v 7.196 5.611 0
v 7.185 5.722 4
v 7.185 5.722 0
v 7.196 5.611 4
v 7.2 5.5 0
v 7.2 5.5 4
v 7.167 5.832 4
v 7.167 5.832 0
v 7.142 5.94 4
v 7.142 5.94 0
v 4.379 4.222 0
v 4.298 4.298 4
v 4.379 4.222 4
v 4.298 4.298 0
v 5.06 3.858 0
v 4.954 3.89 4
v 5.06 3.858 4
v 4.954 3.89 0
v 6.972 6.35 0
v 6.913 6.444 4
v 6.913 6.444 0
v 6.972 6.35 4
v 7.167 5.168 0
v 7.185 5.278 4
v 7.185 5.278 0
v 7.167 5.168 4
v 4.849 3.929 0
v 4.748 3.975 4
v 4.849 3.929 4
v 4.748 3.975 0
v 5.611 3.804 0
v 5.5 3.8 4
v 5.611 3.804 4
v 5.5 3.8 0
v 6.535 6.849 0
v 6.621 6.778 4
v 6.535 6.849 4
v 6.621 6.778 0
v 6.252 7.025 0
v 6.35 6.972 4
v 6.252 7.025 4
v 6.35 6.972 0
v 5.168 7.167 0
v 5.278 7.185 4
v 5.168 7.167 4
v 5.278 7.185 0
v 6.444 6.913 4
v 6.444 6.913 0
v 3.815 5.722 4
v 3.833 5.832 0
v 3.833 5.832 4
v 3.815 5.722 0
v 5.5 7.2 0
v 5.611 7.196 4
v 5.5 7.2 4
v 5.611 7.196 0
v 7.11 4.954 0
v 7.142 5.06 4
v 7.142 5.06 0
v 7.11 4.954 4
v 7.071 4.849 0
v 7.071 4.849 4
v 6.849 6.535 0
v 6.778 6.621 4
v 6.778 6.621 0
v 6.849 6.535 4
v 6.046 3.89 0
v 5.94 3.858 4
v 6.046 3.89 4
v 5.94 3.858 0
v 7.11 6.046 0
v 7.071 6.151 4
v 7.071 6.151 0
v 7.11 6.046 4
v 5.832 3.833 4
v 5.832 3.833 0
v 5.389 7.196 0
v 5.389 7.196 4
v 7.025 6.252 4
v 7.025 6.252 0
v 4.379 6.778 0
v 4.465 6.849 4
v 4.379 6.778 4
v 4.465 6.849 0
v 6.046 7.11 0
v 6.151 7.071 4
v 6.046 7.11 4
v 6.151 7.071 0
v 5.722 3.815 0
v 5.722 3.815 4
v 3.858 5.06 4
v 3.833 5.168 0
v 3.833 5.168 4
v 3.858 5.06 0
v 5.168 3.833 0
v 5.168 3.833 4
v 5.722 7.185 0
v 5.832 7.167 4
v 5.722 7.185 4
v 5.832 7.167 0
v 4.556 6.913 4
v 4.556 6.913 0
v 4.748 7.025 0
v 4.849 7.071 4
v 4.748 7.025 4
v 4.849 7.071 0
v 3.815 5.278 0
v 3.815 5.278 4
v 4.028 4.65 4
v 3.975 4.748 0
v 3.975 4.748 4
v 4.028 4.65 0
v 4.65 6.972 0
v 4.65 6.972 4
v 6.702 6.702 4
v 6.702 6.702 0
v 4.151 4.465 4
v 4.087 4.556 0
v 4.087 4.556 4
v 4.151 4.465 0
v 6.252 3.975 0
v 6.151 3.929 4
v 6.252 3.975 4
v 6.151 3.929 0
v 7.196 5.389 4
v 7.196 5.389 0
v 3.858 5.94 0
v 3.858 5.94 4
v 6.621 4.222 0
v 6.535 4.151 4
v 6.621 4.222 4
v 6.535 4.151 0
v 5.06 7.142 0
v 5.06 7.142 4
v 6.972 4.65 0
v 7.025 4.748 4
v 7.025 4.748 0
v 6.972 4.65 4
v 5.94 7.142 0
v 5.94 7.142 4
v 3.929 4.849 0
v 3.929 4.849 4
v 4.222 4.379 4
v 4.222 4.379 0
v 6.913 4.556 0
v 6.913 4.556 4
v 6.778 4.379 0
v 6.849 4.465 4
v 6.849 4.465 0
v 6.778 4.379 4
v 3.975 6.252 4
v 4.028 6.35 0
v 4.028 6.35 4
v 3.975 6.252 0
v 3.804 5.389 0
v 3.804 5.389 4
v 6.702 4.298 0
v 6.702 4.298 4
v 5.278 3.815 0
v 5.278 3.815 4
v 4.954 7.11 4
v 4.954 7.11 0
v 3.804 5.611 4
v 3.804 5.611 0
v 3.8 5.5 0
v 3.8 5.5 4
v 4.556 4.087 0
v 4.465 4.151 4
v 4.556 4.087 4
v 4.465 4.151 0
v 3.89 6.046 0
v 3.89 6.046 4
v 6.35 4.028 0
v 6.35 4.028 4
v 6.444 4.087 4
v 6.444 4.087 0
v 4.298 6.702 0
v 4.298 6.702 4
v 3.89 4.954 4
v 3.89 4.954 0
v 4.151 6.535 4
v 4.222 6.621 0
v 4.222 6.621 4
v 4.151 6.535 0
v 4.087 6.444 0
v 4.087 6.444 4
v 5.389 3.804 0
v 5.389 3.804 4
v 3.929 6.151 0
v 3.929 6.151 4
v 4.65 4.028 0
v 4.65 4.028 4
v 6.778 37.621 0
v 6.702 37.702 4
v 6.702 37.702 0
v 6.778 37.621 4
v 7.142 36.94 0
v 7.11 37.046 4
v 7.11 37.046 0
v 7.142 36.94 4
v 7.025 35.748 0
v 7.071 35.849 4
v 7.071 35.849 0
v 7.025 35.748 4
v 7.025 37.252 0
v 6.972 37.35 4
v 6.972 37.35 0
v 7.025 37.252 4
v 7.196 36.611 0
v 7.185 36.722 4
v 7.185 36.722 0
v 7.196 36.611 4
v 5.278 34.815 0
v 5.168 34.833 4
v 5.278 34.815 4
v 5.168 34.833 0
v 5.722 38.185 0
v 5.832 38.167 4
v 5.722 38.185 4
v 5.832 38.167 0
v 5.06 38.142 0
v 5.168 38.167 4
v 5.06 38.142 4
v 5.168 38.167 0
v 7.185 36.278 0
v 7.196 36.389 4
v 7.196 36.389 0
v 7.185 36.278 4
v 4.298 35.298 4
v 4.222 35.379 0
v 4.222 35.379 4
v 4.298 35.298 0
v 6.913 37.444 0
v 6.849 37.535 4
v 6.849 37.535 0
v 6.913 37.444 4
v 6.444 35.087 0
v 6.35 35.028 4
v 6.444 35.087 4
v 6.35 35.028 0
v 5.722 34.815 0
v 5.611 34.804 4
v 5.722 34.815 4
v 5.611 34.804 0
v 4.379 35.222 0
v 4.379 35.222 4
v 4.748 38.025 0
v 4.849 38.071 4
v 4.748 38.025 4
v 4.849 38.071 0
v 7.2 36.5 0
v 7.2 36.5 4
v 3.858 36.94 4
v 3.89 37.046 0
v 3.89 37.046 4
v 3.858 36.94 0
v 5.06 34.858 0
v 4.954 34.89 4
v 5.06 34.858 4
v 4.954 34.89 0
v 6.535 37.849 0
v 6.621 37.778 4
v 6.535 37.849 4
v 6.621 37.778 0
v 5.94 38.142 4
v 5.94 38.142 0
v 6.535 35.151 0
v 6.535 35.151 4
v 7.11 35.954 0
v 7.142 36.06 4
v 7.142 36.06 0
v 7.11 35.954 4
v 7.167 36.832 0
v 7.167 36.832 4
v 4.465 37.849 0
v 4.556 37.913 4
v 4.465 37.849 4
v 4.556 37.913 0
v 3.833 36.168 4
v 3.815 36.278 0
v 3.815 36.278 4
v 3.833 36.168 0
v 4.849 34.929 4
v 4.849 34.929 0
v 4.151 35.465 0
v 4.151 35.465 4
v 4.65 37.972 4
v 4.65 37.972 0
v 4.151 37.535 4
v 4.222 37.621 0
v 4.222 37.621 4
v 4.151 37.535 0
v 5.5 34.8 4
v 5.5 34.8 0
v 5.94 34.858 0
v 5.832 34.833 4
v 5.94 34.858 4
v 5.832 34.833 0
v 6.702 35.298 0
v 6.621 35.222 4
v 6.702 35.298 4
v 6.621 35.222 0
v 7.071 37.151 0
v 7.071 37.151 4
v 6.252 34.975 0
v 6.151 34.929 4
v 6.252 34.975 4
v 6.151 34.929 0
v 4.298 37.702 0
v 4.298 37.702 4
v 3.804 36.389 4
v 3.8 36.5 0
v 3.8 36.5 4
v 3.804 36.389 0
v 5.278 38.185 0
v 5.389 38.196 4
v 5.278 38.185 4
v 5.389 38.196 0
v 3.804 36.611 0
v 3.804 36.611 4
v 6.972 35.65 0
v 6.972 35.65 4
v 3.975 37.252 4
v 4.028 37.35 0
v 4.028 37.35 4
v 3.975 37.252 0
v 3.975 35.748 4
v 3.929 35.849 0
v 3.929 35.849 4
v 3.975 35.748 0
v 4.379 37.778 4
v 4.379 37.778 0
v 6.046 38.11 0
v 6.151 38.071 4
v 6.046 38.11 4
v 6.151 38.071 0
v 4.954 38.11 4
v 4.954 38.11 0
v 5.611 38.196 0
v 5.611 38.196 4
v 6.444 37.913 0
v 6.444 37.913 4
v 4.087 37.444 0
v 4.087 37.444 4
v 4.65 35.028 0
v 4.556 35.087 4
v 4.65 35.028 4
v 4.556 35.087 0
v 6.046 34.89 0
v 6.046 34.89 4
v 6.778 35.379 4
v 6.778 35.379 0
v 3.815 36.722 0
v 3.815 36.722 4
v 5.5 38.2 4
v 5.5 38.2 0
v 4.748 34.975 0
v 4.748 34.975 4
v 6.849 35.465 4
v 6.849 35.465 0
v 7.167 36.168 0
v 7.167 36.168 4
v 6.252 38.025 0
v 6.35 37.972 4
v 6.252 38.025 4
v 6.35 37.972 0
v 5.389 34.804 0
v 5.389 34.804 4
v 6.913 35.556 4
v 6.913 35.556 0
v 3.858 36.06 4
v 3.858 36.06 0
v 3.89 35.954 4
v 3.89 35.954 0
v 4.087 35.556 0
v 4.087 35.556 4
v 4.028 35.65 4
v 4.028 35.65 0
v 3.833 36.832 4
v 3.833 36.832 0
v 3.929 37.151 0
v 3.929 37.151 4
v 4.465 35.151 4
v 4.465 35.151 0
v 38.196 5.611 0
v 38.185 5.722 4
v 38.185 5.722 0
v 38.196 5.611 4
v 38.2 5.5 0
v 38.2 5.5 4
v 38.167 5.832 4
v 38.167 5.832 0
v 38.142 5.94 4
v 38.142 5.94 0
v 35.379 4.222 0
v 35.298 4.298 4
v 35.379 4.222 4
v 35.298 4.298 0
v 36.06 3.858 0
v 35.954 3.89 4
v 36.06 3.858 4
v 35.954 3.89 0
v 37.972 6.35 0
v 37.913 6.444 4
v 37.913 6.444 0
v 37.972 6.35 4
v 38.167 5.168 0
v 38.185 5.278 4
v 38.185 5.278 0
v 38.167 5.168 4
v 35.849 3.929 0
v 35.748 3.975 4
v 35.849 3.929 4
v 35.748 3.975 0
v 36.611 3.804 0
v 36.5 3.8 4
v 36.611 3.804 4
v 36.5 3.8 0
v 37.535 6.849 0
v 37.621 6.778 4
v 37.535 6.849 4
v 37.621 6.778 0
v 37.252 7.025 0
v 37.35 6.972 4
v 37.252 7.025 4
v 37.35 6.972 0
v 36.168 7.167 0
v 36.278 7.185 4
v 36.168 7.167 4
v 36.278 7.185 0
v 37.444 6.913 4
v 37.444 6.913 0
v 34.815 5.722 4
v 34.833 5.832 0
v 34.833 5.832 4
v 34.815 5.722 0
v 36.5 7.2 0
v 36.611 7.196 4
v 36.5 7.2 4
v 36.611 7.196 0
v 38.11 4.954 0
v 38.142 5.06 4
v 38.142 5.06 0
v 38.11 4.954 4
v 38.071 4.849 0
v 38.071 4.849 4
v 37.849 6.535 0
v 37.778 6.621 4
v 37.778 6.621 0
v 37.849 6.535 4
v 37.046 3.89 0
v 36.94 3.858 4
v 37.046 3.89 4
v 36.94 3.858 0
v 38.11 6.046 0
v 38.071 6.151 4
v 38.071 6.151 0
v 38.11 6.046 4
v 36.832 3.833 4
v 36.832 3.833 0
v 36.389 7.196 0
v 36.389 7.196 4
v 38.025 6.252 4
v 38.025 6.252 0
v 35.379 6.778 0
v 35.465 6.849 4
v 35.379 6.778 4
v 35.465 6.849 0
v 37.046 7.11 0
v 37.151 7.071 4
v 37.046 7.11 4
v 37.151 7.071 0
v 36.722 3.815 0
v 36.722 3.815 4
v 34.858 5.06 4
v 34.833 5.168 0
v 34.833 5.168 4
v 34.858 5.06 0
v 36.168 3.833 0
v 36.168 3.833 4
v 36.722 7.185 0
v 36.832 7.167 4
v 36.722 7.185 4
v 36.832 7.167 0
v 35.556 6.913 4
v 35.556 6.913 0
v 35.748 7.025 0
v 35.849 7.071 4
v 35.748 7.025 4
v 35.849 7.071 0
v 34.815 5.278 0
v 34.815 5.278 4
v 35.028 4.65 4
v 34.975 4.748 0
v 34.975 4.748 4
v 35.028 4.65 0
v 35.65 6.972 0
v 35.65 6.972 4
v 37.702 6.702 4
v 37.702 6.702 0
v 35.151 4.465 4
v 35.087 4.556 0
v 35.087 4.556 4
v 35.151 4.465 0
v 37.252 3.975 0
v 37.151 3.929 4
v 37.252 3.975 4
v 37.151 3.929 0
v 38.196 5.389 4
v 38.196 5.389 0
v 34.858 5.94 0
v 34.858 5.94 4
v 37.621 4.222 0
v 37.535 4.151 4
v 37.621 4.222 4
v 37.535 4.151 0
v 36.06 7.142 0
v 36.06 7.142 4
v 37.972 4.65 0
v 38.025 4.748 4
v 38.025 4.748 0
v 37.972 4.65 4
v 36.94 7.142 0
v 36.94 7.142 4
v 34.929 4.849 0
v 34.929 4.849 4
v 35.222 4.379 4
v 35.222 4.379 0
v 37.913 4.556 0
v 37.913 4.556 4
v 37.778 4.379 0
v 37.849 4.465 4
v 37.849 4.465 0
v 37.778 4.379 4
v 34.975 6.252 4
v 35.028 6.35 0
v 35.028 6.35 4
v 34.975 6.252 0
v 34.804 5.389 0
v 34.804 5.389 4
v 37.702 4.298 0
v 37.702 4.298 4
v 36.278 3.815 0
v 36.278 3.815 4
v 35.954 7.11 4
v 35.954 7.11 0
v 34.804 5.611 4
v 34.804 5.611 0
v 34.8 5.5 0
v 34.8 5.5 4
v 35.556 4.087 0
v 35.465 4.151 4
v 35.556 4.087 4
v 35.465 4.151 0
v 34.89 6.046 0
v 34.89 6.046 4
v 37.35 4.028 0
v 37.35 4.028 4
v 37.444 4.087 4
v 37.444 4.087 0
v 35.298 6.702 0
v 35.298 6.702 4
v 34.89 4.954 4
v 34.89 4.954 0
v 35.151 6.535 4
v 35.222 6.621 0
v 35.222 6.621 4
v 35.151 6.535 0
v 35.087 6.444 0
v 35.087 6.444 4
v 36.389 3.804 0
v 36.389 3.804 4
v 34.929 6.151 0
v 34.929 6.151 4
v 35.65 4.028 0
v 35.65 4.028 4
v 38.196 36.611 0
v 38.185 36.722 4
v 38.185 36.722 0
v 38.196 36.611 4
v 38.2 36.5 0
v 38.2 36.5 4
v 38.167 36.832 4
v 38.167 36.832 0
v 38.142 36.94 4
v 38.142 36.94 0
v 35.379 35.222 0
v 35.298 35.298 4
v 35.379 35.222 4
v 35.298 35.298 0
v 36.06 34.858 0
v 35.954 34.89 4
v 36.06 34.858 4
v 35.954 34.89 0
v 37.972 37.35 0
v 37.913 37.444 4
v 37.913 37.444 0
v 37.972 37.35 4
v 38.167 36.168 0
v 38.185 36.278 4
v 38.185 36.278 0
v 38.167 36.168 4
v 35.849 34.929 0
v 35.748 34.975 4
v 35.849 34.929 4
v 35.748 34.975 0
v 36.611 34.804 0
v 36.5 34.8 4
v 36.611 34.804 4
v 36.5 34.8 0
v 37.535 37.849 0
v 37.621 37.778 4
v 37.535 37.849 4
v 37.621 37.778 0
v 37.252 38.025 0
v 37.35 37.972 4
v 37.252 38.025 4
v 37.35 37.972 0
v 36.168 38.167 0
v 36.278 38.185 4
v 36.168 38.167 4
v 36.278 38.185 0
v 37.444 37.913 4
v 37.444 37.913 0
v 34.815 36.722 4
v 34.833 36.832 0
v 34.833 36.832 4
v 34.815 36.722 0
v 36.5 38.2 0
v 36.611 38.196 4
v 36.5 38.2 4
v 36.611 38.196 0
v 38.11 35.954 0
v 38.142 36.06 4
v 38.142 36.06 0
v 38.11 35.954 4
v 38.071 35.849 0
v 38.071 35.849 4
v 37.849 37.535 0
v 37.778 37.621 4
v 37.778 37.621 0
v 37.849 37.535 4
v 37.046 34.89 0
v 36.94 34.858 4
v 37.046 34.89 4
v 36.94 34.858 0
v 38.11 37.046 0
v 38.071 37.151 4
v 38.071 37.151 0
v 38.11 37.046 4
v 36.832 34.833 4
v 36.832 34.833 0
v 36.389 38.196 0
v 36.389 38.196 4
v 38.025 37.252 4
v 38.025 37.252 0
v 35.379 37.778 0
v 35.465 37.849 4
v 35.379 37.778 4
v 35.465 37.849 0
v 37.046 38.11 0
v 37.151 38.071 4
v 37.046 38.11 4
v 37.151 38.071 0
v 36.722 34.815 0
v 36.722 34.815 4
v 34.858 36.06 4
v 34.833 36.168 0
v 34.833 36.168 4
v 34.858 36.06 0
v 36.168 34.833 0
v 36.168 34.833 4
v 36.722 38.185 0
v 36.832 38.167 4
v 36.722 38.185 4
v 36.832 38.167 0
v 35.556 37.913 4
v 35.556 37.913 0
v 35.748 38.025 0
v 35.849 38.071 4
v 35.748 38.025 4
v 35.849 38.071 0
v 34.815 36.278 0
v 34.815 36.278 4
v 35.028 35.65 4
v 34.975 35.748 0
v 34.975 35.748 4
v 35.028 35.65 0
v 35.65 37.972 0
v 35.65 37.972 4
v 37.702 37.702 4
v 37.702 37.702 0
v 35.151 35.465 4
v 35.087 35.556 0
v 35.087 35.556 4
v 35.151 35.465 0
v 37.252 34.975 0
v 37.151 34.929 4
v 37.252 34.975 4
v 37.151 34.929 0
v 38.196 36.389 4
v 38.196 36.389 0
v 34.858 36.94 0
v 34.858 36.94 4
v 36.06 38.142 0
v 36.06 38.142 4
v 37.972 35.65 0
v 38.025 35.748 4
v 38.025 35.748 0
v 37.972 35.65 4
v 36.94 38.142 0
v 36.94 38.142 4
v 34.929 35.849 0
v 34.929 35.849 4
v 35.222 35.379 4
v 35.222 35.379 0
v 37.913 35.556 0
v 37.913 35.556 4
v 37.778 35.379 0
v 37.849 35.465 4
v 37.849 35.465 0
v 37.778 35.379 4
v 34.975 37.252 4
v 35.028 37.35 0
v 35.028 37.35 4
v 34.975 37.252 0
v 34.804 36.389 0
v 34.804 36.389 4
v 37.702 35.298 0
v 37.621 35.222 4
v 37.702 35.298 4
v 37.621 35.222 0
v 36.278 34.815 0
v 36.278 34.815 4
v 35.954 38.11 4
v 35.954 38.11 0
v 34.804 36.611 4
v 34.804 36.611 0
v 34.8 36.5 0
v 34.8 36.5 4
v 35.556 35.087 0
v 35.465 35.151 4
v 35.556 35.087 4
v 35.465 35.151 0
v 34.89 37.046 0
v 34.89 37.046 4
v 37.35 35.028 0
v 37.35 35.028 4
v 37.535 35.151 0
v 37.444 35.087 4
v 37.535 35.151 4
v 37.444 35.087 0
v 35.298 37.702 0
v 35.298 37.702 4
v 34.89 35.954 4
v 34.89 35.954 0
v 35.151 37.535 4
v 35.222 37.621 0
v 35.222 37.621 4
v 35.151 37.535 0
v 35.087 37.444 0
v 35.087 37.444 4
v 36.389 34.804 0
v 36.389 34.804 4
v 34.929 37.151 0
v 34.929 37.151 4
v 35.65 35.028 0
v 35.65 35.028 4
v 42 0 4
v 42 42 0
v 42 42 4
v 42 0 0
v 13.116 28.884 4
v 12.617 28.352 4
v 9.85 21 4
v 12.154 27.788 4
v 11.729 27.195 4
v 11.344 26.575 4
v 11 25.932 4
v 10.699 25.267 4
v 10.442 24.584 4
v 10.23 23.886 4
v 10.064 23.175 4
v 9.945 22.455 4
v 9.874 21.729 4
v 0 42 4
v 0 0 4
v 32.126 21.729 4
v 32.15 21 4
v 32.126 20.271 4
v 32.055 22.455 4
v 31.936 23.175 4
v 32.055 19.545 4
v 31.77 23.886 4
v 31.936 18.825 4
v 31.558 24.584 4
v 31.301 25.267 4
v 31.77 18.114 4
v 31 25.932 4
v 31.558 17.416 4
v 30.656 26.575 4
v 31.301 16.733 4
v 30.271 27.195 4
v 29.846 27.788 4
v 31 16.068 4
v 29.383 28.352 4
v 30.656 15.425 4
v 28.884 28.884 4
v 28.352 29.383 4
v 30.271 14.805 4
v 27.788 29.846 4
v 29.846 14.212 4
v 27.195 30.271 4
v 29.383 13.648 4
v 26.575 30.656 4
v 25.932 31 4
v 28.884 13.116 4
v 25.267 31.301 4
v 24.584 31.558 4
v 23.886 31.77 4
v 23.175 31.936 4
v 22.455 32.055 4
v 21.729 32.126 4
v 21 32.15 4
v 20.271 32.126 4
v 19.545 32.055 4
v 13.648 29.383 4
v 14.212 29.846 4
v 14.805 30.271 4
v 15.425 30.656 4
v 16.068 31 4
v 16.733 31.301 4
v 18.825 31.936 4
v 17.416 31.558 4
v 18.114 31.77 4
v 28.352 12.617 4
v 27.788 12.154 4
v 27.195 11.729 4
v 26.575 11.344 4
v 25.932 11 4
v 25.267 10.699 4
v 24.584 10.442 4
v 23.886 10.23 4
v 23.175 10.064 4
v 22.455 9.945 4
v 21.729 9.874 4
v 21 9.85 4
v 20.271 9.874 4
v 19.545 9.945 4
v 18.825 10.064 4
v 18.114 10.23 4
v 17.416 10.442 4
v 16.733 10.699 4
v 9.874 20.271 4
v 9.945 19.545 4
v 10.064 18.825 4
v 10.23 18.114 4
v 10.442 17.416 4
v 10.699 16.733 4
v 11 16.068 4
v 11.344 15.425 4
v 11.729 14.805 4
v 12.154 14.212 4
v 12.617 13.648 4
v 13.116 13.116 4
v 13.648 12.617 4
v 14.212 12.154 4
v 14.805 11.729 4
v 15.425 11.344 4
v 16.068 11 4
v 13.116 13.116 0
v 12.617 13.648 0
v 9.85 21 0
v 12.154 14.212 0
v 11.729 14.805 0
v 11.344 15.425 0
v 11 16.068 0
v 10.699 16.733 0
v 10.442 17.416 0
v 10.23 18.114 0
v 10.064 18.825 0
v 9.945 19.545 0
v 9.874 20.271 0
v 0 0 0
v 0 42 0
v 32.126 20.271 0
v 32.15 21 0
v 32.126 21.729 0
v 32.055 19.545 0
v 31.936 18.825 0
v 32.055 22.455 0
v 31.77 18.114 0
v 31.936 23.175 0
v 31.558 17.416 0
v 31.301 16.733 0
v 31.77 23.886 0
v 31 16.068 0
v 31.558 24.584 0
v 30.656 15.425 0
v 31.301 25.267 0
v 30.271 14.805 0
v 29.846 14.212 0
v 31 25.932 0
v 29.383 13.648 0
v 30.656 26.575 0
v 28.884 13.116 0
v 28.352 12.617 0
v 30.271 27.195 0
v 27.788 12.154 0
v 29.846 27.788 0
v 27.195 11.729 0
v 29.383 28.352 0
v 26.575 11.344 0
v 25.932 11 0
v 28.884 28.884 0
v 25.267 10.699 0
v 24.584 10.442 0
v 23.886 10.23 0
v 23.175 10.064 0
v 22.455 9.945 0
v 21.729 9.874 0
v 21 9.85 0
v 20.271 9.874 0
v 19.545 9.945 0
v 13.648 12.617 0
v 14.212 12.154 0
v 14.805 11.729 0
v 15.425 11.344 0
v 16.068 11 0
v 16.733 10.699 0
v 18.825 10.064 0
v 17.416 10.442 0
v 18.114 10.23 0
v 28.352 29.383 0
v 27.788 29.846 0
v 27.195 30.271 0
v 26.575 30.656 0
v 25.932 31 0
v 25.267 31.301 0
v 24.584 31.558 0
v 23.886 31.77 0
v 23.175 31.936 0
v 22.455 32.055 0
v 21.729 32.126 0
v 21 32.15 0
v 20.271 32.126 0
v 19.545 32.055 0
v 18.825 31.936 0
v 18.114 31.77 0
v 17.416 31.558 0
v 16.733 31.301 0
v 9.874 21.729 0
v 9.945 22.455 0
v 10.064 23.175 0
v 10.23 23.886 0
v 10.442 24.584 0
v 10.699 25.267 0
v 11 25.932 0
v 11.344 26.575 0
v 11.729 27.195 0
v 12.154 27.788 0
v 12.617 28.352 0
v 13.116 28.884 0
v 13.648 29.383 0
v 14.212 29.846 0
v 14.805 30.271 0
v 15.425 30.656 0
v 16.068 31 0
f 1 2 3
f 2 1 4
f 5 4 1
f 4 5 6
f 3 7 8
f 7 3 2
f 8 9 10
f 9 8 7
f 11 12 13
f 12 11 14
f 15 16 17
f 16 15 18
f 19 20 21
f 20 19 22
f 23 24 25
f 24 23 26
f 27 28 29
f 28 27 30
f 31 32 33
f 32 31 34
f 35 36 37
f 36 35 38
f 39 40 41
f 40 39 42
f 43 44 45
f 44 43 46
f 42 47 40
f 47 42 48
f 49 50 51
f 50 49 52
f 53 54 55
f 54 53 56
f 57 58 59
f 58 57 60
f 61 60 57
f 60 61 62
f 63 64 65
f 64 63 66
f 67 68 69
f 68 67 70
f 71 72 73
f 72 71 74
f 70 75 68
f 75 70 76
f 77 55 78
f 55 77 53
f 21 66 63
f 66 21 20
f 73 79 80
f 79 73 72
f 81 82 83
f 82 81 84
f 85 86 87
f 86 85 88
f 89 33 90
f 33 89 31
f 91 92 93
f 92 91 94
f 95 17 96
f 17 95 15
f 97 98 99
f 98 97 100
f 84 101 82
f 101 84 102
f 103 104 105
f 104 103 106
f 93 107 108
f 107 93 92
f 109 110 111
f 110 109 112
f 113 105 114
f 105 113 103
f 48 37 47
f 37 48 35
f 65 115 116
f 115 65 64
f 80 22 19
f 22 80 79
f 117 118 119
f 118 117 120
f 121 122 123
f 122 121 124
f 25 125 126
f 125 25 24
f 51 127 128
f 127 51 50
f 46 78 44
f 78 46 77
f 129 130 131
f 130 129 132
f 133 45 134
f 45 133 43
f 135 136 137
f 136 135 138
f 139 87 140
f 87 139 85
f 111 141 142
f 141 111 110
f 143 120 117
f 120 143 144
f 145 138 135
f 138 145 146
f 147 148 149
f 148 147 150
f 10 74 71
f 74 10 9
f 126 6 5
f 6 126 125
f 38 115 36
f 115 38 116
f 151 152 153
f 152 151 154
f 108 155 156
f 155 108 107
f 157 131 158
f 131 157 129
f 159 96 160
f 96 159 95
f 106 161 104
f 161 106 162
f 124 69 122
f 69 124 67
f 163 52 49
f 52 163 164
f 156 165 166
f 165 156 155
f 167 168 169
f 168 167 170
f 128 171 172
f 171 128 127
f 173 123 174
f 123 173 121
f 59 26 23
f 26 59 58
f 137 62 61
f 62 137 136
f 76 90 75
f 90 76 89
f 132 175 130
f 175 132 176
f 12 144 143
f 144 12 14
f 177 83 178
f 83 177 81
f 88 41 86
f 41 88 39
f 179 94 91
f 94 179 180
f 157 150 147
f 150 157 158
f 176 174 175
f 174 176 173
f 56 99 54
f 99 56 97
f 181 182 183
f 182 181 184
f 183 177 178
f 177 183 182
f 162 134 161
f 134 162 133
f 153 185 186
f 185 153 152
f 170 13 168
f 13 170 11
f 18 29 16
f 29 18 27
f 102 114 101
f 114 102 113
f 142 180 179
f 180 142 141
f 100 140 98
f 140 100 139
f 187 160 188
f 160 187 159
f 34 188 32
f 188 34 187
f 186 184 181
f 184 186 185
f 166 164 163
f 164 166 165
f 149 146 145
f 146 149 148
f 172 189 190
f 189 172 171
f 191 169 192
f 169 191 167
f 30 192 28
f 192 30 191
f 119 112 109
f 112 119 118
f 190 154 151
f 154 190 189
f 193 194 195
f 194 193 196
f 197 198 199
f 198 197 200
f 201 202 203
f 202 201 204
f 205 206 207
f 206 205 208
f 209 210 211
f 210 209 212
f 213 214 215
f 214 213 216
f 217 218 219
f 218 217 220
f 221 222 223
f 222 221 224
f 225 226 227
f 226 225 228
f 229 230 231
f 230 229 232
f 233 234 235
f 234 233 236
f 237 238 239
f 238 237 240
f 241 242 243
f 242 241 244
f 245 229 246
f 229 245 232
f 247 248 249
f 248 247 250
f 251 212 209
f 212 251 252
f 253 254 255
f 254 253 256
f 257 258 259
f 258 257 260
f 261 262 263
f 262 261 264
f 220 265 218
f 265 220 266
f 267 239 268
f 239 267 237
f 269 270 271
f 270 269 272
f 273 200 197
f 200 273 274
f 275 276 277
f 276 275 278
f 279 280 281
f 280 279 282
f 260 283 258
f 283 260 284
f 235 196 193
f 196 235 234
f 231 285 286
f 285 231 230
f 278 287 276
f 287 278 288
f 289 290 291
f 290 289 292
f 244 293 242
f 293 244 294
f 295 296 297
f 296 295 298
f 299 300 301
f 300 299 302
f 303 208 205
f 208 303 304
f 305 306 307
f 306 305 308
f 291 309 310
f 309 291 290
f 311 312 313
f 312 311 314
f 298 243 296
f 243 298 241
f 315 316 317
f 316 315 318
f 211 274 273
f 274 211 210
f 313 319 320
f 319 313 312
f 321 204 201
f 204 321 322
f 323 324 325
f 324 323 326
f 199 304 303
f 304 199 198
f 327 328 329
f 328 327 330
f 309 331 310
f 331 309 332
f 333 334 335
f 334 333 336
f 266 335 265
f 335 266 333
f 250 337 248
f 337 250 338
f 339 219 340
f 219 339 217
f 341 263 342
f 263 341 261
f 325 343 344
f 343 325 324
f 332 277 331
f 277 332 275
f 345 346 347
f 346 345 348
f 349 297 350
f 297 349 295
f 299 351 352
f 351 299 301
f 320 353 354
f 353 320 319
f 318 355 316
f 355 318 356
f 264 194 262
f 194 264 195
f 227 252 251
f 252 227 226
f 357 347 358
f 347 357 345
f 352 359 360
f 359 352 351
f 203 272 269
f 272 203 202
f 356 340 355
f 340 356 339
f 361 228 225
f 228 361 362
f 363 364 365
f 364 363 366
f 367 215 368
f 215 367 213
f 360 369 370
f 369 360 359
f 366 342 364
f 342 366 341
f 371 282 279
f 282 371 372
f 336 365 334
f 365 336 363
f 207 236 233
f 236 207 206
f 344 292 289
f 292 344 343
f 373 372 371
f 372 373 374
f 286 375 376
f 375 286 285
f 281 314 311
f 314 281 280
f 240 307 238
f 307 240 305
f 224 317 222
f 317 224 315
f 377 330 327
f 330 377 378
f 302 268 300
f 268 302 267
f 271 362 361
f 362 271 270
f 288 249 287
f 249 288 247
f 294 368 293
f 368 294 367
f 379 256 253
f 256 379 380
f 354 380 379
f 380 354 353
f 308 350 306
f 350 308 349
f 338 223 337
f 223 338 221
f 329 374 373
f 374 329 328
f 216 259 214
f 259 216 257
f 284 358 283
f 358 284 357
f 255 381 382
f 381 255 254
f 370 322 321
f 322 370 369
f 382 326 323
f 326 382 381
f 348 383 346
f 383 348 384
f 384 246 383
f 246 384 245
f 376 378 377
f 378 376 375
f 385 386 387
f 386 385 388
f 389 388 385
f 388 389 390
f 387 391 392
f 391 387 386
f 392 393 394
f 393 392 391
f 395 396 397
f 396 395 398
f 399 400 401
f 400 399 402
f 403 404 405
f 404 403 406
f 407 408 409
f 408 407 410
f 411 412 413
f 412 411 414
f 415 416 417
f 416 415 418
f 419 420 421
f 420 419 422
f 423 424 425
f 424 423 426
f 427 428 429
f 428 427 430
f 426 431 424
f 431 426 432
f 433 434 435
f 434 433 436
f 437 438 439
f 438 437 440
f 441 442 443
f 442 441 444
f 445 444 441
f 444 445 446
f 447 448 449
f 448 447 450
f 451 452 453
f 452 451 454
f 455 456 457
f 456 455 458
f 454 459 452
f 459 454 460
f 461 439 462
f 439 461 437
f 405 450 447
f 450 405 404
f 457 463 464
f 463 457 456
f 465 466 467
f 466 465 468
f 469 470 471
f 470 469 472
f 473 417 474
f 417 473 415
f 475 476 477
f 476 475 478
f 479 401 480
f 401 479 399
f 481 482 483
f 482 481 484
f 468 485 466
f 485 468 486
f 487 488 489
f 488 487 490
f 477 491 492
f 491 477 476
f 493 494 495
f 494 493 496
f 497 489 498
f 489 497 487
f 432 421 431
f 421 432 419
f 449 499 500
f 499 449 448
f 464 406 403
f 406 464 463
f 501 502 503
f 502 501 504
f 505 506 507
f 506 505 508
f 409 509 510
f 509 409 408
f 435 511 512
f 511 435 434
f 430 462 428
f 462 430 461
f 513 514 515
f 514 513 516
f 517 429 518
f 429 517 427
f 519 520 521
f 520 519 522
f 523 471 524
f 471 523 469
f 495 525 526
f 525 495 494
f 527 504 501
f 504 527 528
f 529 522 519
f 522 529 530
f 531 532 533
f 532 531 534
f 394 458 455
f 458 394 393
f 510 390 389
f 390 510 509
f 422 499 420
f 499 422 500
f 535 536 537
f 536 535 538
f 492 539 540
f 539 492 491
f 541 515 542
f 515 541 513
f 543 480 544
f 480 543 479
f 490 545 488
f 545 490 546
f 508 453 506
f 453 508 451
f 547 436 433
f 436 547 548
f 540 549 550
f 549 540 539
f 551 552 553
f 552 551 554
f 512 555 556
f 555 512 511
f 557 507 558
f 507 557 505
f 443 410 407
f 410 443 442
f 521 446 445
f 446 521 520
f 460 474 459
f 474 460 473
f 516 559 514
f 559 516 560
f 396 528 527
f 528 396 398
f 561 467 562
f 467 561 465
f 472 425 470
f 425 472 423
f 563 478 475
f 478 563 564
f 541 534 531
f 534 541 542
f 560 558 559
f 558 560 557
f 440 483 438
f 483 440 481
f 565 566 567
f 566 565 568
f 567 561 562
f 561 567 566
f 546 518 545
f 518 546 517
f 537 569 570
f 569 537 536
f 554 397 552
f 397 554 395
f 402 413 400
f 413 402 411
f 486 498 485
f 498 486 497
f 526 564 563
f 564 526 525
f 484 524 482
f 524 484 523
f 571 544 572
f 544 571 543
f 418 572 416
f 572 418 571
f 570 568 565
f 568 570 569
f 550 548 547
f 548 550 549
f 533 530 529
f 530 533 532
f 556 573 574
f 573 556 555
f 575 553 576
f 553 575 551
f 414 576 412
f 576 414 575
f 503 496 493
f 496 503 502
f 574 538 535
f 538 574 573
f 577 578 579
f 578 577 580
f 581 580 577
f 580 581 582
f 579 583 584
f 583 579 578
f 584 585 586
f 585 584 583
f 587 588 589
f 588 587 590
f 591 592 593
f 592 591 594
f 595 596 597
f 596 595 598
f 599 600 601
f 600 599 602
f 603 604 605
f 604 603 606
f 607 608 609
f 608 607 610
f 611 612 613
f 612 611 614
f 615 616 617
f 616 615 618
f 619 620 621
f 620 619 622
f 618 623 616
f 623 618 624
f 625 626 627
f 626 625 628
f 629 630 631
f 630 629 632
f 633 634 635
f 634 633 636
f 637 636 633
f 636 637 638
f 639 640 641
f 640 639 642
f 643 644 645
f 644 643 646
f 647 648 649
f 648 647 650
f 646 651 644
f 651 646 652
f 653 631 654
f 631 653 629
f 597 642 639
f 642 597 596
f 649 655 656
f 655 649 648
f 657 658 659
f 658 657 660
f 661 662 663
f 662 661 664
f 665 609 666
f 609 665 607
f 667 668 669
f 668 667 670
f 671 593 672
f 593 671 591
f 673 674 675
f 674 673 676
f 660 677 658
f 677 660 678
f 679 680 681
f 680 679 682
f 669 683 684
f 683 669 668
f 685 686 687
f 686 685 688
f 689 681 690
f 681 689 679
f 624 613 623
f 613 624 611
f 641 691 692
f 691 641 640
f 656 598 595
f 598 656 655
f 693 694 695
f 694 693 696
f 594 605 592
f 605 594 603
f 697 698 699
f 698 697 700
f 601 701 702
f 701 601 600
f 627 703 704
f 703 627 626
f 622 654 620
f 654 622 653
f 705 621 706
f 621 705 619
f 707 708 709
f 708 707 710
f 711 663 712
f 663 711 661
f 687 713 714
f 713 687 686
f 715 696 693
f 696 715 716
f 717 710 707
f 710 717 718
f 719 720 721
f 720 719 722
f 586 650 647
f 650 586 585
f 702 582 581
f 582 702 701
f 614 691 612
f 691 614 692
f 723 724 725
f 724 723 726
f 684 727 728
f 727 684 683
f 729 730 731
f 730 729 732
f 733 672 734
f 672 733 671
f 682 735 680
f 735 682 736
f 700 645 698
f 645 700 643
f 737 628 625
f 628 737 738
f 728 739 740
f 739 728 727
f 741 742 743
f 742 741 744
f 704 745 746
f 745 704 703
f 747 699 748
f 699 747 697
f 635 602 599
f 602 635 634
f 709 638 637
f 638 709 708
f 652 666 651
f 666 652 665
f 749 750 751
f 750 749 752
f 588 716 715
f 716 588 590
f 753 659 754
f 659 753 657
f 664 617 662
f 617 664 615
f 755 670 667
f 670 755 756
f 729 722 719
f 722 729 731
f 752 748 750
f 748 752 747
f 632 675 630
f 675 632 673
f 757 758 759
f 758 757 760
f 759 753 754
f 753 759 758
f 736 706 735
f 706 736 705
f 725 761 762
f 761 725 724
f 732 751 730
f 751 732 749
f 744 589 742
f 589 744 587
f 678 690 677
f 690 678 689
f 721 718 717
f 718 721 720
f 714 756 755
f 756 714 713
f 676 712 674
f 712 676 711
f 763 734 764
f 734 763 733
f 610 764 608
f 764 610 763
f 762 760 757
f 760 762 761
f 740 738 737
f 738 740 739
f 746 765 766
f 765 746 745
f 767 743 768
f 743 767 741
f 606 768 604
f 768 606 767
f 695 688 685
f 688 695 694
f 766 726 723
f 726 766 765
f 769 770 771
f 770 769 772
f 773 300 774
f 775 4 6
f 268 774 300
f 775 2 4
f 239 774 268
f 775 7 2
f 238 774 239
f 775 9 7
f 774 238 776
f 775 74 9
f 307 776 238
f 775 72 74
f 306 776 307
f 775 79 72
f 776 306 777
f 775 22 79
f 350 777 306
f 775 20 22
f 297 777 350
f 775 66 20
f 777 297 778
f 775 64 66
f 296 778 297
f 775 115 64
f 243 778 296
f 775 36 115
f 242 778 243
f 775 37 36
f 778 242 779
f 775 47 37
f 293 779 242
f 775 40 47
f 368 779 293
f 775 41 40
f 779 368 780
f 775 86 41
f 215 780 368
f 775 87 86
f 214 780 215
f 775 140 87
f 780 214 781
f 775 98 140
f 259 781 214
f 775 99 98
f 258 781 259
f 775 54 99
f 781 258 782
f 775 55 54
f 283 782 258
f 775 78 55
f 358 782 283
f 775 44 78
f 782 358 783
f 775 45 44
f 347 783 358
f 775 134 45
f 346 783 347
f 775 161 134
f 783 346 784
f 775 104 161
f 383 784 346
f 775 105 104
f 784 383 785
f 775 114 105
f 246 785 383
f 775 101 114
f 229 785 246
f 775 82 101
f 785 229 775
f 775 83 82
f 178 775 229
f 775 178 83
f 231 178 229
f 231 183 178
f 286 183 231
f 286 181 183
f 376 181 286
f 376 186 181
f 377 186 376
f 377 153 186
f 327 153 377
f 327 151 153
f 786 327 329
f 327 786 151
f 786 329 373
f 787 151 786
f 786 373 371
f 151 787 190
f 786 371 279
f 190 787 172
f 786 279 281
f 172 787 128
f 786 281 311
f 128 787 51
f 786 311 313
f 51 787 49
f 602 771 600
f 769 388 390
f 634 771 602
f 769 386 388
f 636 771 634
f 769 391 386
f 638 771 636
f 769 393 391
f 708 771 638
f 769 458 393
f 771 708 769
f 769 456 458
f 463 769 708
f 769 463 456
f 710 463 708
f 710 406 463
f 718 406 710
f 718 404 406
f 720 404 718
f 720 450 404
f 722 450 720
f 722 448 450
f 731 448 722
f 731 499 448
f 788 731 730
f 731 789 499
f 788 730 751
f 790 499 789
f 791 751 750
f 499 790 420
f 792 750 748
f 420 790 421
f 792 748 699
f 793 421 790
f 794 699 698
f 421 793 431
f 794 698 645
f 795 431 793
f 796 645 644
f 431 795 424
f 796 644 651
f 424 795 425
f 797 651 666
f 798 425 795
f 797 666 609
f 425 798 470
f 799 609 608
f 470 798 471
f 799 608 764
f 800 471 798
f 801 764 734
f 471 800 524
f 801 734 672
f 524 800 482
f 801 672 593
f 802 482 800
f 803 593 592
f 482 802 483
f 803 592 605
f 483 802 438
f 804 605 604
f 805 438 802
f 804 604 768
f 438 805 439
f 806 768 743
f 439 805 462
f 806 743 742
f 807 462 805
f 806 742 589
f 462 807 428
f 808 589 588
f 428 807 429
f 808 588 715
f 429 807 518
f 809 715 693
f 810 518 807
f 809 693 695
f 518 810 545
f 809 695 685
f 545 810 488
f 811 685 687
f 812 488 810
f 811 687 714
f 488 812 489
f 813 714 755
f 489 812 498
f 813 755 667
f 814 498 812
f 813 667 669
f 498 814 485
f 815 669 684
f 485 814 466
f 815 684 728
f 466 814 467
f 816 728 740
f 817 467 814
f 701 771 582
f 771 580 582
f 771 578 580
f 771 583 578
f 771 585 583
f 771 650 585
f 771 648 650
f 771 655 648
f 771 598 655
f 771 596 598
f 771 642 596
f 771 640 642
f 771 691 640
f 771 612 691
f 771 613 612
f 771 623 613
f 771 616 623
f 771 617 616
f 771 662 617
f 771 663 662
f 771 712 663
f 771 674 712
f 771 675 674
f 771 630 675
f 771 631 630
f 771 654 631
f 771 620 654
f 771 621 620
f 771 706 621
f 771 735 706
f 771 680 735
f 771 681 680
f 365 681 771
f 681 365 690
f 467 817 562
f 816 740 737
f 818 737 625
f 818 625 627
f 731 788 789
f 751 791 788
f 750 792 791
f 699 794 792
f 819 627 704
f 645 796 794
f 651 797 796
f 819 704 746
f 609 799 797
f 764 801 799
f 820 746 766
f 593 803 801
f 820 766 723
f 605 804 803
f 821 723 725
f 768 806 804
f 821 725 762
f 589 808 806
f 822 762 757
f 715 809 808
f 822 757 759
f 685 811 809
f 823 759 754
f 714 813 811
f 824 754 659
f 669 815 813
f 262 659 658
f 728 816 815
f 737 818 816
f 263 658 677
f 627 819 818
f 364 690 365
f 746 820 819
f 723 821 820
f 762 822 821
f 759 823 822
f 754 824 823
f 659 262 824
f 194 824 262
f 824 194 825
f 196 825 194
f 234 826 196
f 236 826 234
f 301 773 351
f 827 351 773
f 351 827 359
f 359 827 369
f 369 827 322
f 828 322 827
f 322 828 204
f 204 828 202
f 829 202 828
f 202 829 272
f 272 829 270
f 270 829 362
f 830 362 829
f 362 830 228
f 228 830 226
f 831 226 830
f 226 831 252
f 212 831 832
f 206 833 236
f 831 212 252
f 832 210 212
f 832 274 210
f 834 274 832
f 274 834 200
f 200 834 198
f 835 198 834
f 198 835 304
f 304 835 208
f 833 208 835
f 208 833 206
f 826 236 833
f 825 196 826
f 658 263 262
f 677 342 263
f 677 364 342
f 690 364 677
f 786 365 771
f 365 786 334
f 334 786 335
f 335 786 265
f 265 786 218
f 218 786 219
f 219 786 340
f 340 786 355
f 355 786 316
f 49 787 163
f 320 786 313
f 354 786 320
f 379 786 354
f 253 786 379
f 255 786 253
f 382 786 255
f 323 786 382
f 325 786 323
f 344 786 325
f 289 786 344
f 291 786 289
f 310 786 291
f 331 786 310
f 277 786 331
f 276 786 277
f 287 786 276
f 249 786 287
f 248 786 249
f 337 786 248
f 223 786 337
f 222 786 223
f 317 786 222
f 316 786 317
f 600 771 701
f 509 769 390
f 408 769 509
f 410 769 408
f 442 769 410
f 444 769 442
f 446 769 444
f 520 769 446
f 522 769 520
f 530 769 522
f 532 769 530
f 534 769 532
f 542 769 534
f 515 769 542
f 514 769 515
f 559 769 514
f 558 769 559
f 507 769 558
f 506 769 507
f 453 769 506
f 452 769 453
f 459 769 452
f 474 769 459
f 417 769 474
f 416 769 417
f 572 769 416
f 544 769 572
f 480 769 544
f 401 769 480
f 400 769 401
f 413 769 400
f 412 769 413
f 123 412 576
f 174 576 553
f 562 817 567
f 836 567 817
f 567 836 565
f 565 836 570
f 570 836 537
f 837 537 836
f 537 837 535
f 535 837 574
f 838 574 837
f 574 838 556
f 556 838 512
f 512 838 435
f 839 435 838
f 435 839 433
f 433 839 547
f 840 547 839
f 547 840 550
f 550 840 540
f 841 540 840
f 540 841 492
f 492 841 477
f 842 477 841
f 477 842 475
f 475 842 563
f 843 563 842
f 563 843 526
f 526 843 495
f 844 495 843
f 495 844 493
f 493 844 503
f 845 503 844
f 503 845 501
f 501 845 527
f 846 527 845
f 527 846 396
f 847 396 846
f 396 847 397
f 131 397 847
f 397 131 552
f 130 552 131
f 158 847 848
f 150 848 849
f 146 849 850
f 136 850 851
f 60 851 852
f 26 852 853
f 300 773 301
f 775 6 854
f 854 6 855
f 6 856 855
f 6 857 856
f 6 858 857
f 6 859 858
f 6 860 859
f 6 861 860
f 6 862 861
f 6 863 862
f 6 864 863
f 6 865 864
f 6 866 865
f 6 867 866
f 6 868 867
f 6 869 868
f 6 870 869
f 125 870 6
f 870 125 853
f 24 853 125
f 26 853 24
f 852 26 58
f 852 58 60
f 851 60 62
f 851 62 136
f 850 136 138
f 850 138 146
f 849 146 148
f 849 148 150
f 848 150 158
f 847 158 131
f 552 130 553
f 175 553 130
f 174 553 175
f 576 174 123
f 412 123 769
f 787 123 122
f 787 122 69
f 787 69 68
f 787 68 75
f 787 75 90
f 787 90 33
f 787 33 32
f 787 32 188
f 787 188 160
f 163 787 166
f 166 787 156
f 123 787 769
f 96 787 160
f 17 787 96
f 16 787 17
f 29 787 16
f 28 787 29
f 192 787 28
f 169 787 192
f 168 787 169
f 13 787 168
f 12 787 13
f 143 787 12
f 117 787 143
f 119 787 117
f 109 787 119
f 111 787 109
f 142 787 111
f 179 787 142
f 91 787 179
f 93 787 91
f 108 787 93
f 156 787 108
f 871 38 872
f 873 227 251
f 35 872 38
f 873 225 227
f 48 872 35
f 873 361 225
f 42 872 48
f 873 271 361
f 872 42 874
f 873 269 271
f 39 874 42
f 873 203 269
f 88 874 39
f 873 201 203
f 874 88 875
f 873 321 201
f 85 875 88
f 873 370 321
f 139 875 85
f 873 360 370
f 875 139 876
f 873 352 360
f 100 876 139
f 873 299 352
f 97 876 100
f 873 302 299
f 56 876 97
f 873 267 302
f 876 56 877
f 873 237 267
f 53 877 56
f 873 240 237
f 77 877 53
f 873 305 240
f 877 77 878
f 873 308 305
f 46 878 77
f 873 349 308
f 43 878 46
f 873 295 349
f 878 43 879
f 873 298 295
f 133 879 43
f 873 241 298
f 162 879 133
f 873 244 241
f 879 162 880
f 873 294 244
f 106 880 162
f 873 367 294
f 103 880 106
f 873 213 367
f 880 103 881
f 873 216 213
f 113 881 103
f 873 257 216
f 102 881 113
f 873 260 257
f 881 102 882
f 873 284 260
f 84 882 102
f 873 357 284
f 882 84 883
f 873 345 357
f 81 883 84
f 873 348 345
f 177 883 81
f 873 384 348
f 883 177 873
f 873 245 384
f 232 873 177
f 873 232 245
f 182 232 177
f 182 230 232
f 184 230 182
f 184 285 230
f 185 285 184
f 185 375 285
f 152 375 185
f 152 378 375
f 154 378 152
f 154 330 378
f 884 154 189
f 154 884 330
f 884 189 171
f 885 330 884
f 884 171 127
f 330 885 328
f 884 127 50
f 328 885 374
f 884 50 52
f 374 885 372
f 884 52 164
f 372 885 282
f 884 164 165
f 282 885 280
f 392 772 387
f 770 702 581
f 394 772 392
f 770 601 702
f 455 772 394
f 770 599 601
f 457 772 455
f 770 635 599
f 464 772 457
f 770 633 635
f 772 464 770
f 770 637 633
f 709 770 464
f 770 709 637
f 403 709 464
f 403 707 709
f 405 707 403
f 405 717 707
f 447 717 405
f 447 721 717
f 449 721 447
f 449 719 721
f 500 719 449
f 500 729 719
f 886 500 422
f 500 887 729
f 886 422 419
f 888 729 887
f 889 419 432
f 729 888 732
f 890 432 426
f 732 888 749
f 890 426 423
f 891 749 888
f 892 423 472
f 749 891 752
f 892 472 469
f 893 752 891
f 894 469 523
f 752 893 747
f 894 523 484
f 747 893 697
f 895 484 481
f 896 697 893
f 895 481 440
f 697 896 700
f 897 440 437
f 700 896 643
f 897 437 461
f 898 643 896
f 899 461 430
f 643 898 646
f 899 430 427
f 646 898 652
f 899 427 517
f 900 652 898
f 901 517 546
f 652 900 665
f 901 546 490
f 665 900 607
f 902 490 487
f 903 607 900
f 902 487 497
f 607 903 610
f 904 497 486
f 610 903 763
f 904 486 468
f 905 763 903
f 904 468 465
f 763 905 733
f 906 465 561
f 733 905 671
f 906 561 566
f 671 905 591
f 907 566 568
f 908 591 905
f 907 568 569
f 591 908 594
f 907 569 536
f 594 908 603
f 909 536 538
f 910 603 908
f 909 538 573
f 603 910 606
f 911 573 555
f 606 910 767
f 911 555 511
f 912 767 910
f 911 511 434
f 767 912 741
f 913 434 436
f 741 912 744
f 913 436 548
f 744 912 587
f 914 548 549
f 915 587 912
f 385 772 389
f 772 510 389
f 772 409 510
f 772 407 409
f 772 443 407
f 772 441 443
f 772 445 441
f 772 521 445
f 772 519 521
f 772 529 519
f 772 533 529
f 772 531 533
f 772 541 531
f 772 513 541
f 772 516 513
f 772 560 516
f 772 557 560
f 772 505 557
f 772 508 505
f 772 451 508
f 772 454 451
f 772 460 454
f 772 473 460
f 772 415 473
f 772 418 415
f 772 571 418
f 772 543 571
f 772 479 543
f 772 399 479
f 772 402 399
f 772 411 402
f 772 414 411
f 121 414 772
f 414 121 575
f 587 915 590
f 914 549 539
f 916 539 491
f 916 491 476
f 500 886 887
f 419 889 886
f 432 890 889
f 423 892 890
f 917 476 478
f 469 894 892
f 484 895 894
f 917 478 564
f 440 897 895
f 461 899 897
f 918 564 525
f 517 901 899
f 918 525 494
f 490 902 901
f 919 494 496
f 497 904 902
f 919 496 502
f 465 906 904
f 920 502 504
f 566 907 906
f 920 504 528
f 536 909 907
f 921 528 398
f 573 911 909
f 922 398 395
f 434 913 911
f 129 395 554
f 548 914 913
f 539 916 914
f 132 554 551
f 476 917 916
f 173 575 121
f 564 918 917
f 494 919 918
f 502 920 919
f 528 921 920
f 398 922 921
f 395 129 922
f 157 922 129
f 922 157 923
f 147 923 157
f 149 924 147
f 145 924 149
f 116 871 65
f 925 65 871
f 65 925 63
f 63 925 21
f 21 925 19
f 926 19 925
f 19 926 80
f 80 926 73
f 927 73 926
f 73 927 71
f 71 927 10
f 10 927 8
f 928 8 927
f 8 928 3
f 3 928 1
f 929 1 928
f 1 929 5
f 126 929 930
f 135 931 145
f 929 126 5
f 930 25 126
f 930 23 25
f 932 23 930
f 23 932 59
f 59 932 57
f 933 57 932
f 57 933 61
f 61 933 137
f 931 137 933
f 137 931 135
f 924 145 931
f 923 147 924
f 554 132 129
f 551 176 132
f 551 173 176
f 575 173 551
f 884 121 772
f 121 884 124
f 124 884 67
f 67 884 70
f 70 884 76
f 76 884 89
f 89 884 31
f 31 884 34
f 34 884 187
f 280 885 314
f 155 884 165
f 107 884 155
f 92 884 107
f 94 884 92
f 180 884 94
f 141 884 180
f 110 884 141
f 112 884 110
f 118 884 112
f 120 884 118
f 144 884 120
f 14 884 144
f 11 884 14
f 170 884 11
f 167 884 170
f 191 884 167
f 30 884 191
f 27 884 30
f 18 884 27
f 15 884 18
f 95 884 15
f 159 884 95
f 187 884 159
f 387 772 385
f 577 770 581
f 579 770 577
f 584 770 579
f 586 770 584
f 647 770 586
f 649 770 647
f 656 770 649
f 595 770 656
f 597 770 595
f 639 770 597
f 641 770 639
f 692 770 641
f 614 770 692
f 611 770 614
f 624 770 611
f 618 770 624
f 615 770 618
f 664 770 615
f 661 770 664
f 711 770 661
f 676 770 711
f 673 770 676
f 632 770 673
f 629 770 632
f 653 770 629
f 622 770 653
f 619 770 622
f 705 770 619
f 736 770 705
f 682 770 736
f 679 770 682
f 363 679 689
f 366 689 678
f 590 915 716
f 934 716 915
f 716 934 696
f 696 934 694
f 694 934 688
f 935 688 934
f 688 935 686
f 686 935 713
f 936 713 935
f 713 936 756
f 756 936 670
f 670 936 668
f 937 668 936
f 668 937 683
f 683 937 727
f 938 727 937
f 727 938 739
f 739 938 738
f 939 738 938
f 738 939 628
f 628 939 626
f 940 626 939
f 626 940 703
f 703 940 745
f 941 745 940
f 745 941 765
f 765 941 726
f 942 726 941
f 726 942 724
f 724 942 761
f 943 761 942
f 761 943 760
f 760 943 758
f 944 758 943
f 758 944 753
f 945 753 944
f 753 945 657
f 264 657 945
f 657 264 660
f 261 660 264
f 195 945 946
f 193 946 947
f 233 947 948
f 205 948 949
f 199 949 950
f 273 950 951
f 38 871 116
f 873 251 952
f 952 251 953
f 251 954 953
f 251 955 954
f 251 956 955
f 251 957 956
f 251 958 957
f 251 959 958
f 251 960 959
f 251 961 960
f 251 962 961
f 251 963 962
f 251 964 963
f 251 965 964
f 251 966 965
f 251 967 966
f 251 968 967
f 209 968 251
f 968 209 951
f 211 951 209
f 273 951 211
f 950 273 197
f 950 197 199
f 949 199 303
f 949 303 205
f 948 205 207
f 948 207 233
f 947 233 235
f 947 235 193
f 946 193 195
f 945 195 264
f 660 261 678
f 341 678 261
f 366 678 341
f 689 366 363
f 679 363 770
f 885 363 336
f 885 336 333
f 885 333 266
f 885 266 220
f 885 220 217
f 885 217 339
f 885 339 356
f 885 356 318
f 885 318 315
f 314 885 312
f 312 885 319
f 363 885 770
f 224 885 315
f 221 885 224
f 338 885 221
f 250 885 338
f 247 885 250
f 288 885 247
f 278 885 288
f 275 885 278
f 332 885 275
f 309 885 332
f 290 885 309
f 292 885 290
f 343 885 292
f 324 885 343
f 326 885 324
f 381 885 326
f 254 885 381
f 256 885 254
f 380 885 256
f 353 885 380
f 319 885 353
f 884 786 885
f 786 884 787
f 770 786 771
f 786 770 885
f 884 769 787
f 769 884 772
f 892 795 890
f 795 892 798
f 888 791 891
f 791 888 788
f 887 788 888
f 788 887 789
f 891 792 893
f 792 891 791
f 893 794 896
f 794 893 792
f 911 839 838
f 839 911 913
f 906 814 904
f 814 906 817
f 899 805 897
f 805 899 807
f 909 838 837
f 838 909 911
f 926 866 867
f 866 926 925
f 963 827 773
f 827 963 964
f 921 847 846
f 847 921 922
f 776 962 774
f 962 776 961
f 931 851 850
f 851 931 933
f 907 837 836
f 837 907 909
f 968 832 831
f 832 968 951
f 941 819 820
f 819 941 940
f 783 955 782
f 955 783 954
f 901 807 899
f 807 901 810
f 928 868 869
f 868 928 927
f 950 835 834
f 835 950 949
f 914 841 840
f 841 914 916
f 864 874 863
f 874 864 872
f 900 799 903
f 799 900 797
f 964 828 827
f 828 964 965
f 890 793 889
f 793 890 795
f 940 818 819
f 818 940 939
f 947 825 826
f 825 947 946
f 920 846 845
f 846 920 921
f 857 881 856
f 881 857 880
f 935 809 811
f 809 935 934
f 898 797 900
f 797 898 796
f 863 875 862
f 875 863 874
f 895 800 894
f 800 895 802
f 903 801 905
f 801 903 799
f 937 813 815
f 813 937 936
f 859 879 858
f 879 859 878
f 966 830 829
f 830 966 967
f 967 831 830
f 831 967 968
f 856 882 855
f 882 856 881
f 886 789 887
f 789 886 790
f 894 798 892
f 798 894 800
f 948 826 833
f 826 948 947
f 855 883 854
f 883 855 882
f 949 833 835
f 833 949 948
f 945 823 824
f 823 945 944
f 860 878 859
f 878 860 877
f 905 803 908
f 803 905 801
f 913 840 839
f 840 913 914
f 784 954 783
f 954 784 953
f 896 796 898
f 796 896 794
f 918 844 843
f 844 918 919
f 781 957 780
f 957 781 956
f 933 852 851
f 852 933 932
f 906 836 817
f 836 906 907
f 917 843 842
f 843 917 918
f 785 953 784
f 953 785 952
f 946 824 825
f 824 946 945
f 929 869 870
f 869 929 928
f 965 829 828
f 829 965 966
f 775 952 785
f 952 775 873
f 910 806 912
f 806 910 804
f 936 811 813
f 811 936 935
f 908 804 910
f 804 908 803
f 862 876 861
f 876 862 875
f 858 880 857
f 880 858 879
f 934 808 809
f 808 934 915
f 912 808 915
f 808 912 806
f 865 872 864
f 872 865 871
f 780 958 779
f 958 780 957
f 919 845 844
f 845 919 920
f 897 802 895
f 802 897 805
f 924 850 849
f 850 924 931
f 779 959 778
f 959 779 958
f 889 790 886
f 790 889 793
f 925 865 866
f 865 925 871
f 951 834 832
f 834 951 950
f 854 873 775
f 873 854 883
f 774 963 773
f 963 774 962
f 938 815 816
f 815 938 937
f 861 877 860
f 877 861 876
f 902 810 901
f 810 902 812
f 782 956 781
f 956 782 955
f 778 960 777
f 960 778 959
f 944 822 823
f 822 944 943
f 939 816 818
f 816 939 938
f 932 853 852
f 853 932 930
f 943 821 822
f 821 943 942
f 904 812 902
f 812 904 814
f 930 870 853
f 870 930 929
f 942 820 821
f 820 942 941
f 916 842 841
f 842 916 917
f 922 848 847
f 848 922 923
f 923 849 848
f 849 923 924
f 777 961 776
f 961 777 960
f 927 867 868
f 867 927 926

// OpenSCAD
// Motor mounting plate: 42 x 42 x 4 mm, four Ø3.4 through-holes on a
// 31 mm square centred on the plate, one Ø22.3 pilot bore at the centre.

plate_w = 42;
plate_d = 42;
plate_t = 4;
mount_hole_d = 3.4;
mount_square = 31;   // side of the square the mounting holes sit on
pilot_bore_d = 22.3;
facets = 96;

// datum: plate centre in XY
cx = plate_w / 2;
cy = plate_d / 2;

module plate() {
    cube([plate_w, plate_d, plate_t]);
}

module hole(x, y, d) {
    translate([x, y, -1]) cylinder(d = d, h = plate_t + 2, $fn = facets);
}

difference() {
    plate();
    hole(cx, cy, pilot_bore_d);
    for (sx = [-1, 1], sy = [-1, 1])
        hole(cx + sx * mount_square / 2, cy + sy * mount_square / 2, mount_hole_d);
}
